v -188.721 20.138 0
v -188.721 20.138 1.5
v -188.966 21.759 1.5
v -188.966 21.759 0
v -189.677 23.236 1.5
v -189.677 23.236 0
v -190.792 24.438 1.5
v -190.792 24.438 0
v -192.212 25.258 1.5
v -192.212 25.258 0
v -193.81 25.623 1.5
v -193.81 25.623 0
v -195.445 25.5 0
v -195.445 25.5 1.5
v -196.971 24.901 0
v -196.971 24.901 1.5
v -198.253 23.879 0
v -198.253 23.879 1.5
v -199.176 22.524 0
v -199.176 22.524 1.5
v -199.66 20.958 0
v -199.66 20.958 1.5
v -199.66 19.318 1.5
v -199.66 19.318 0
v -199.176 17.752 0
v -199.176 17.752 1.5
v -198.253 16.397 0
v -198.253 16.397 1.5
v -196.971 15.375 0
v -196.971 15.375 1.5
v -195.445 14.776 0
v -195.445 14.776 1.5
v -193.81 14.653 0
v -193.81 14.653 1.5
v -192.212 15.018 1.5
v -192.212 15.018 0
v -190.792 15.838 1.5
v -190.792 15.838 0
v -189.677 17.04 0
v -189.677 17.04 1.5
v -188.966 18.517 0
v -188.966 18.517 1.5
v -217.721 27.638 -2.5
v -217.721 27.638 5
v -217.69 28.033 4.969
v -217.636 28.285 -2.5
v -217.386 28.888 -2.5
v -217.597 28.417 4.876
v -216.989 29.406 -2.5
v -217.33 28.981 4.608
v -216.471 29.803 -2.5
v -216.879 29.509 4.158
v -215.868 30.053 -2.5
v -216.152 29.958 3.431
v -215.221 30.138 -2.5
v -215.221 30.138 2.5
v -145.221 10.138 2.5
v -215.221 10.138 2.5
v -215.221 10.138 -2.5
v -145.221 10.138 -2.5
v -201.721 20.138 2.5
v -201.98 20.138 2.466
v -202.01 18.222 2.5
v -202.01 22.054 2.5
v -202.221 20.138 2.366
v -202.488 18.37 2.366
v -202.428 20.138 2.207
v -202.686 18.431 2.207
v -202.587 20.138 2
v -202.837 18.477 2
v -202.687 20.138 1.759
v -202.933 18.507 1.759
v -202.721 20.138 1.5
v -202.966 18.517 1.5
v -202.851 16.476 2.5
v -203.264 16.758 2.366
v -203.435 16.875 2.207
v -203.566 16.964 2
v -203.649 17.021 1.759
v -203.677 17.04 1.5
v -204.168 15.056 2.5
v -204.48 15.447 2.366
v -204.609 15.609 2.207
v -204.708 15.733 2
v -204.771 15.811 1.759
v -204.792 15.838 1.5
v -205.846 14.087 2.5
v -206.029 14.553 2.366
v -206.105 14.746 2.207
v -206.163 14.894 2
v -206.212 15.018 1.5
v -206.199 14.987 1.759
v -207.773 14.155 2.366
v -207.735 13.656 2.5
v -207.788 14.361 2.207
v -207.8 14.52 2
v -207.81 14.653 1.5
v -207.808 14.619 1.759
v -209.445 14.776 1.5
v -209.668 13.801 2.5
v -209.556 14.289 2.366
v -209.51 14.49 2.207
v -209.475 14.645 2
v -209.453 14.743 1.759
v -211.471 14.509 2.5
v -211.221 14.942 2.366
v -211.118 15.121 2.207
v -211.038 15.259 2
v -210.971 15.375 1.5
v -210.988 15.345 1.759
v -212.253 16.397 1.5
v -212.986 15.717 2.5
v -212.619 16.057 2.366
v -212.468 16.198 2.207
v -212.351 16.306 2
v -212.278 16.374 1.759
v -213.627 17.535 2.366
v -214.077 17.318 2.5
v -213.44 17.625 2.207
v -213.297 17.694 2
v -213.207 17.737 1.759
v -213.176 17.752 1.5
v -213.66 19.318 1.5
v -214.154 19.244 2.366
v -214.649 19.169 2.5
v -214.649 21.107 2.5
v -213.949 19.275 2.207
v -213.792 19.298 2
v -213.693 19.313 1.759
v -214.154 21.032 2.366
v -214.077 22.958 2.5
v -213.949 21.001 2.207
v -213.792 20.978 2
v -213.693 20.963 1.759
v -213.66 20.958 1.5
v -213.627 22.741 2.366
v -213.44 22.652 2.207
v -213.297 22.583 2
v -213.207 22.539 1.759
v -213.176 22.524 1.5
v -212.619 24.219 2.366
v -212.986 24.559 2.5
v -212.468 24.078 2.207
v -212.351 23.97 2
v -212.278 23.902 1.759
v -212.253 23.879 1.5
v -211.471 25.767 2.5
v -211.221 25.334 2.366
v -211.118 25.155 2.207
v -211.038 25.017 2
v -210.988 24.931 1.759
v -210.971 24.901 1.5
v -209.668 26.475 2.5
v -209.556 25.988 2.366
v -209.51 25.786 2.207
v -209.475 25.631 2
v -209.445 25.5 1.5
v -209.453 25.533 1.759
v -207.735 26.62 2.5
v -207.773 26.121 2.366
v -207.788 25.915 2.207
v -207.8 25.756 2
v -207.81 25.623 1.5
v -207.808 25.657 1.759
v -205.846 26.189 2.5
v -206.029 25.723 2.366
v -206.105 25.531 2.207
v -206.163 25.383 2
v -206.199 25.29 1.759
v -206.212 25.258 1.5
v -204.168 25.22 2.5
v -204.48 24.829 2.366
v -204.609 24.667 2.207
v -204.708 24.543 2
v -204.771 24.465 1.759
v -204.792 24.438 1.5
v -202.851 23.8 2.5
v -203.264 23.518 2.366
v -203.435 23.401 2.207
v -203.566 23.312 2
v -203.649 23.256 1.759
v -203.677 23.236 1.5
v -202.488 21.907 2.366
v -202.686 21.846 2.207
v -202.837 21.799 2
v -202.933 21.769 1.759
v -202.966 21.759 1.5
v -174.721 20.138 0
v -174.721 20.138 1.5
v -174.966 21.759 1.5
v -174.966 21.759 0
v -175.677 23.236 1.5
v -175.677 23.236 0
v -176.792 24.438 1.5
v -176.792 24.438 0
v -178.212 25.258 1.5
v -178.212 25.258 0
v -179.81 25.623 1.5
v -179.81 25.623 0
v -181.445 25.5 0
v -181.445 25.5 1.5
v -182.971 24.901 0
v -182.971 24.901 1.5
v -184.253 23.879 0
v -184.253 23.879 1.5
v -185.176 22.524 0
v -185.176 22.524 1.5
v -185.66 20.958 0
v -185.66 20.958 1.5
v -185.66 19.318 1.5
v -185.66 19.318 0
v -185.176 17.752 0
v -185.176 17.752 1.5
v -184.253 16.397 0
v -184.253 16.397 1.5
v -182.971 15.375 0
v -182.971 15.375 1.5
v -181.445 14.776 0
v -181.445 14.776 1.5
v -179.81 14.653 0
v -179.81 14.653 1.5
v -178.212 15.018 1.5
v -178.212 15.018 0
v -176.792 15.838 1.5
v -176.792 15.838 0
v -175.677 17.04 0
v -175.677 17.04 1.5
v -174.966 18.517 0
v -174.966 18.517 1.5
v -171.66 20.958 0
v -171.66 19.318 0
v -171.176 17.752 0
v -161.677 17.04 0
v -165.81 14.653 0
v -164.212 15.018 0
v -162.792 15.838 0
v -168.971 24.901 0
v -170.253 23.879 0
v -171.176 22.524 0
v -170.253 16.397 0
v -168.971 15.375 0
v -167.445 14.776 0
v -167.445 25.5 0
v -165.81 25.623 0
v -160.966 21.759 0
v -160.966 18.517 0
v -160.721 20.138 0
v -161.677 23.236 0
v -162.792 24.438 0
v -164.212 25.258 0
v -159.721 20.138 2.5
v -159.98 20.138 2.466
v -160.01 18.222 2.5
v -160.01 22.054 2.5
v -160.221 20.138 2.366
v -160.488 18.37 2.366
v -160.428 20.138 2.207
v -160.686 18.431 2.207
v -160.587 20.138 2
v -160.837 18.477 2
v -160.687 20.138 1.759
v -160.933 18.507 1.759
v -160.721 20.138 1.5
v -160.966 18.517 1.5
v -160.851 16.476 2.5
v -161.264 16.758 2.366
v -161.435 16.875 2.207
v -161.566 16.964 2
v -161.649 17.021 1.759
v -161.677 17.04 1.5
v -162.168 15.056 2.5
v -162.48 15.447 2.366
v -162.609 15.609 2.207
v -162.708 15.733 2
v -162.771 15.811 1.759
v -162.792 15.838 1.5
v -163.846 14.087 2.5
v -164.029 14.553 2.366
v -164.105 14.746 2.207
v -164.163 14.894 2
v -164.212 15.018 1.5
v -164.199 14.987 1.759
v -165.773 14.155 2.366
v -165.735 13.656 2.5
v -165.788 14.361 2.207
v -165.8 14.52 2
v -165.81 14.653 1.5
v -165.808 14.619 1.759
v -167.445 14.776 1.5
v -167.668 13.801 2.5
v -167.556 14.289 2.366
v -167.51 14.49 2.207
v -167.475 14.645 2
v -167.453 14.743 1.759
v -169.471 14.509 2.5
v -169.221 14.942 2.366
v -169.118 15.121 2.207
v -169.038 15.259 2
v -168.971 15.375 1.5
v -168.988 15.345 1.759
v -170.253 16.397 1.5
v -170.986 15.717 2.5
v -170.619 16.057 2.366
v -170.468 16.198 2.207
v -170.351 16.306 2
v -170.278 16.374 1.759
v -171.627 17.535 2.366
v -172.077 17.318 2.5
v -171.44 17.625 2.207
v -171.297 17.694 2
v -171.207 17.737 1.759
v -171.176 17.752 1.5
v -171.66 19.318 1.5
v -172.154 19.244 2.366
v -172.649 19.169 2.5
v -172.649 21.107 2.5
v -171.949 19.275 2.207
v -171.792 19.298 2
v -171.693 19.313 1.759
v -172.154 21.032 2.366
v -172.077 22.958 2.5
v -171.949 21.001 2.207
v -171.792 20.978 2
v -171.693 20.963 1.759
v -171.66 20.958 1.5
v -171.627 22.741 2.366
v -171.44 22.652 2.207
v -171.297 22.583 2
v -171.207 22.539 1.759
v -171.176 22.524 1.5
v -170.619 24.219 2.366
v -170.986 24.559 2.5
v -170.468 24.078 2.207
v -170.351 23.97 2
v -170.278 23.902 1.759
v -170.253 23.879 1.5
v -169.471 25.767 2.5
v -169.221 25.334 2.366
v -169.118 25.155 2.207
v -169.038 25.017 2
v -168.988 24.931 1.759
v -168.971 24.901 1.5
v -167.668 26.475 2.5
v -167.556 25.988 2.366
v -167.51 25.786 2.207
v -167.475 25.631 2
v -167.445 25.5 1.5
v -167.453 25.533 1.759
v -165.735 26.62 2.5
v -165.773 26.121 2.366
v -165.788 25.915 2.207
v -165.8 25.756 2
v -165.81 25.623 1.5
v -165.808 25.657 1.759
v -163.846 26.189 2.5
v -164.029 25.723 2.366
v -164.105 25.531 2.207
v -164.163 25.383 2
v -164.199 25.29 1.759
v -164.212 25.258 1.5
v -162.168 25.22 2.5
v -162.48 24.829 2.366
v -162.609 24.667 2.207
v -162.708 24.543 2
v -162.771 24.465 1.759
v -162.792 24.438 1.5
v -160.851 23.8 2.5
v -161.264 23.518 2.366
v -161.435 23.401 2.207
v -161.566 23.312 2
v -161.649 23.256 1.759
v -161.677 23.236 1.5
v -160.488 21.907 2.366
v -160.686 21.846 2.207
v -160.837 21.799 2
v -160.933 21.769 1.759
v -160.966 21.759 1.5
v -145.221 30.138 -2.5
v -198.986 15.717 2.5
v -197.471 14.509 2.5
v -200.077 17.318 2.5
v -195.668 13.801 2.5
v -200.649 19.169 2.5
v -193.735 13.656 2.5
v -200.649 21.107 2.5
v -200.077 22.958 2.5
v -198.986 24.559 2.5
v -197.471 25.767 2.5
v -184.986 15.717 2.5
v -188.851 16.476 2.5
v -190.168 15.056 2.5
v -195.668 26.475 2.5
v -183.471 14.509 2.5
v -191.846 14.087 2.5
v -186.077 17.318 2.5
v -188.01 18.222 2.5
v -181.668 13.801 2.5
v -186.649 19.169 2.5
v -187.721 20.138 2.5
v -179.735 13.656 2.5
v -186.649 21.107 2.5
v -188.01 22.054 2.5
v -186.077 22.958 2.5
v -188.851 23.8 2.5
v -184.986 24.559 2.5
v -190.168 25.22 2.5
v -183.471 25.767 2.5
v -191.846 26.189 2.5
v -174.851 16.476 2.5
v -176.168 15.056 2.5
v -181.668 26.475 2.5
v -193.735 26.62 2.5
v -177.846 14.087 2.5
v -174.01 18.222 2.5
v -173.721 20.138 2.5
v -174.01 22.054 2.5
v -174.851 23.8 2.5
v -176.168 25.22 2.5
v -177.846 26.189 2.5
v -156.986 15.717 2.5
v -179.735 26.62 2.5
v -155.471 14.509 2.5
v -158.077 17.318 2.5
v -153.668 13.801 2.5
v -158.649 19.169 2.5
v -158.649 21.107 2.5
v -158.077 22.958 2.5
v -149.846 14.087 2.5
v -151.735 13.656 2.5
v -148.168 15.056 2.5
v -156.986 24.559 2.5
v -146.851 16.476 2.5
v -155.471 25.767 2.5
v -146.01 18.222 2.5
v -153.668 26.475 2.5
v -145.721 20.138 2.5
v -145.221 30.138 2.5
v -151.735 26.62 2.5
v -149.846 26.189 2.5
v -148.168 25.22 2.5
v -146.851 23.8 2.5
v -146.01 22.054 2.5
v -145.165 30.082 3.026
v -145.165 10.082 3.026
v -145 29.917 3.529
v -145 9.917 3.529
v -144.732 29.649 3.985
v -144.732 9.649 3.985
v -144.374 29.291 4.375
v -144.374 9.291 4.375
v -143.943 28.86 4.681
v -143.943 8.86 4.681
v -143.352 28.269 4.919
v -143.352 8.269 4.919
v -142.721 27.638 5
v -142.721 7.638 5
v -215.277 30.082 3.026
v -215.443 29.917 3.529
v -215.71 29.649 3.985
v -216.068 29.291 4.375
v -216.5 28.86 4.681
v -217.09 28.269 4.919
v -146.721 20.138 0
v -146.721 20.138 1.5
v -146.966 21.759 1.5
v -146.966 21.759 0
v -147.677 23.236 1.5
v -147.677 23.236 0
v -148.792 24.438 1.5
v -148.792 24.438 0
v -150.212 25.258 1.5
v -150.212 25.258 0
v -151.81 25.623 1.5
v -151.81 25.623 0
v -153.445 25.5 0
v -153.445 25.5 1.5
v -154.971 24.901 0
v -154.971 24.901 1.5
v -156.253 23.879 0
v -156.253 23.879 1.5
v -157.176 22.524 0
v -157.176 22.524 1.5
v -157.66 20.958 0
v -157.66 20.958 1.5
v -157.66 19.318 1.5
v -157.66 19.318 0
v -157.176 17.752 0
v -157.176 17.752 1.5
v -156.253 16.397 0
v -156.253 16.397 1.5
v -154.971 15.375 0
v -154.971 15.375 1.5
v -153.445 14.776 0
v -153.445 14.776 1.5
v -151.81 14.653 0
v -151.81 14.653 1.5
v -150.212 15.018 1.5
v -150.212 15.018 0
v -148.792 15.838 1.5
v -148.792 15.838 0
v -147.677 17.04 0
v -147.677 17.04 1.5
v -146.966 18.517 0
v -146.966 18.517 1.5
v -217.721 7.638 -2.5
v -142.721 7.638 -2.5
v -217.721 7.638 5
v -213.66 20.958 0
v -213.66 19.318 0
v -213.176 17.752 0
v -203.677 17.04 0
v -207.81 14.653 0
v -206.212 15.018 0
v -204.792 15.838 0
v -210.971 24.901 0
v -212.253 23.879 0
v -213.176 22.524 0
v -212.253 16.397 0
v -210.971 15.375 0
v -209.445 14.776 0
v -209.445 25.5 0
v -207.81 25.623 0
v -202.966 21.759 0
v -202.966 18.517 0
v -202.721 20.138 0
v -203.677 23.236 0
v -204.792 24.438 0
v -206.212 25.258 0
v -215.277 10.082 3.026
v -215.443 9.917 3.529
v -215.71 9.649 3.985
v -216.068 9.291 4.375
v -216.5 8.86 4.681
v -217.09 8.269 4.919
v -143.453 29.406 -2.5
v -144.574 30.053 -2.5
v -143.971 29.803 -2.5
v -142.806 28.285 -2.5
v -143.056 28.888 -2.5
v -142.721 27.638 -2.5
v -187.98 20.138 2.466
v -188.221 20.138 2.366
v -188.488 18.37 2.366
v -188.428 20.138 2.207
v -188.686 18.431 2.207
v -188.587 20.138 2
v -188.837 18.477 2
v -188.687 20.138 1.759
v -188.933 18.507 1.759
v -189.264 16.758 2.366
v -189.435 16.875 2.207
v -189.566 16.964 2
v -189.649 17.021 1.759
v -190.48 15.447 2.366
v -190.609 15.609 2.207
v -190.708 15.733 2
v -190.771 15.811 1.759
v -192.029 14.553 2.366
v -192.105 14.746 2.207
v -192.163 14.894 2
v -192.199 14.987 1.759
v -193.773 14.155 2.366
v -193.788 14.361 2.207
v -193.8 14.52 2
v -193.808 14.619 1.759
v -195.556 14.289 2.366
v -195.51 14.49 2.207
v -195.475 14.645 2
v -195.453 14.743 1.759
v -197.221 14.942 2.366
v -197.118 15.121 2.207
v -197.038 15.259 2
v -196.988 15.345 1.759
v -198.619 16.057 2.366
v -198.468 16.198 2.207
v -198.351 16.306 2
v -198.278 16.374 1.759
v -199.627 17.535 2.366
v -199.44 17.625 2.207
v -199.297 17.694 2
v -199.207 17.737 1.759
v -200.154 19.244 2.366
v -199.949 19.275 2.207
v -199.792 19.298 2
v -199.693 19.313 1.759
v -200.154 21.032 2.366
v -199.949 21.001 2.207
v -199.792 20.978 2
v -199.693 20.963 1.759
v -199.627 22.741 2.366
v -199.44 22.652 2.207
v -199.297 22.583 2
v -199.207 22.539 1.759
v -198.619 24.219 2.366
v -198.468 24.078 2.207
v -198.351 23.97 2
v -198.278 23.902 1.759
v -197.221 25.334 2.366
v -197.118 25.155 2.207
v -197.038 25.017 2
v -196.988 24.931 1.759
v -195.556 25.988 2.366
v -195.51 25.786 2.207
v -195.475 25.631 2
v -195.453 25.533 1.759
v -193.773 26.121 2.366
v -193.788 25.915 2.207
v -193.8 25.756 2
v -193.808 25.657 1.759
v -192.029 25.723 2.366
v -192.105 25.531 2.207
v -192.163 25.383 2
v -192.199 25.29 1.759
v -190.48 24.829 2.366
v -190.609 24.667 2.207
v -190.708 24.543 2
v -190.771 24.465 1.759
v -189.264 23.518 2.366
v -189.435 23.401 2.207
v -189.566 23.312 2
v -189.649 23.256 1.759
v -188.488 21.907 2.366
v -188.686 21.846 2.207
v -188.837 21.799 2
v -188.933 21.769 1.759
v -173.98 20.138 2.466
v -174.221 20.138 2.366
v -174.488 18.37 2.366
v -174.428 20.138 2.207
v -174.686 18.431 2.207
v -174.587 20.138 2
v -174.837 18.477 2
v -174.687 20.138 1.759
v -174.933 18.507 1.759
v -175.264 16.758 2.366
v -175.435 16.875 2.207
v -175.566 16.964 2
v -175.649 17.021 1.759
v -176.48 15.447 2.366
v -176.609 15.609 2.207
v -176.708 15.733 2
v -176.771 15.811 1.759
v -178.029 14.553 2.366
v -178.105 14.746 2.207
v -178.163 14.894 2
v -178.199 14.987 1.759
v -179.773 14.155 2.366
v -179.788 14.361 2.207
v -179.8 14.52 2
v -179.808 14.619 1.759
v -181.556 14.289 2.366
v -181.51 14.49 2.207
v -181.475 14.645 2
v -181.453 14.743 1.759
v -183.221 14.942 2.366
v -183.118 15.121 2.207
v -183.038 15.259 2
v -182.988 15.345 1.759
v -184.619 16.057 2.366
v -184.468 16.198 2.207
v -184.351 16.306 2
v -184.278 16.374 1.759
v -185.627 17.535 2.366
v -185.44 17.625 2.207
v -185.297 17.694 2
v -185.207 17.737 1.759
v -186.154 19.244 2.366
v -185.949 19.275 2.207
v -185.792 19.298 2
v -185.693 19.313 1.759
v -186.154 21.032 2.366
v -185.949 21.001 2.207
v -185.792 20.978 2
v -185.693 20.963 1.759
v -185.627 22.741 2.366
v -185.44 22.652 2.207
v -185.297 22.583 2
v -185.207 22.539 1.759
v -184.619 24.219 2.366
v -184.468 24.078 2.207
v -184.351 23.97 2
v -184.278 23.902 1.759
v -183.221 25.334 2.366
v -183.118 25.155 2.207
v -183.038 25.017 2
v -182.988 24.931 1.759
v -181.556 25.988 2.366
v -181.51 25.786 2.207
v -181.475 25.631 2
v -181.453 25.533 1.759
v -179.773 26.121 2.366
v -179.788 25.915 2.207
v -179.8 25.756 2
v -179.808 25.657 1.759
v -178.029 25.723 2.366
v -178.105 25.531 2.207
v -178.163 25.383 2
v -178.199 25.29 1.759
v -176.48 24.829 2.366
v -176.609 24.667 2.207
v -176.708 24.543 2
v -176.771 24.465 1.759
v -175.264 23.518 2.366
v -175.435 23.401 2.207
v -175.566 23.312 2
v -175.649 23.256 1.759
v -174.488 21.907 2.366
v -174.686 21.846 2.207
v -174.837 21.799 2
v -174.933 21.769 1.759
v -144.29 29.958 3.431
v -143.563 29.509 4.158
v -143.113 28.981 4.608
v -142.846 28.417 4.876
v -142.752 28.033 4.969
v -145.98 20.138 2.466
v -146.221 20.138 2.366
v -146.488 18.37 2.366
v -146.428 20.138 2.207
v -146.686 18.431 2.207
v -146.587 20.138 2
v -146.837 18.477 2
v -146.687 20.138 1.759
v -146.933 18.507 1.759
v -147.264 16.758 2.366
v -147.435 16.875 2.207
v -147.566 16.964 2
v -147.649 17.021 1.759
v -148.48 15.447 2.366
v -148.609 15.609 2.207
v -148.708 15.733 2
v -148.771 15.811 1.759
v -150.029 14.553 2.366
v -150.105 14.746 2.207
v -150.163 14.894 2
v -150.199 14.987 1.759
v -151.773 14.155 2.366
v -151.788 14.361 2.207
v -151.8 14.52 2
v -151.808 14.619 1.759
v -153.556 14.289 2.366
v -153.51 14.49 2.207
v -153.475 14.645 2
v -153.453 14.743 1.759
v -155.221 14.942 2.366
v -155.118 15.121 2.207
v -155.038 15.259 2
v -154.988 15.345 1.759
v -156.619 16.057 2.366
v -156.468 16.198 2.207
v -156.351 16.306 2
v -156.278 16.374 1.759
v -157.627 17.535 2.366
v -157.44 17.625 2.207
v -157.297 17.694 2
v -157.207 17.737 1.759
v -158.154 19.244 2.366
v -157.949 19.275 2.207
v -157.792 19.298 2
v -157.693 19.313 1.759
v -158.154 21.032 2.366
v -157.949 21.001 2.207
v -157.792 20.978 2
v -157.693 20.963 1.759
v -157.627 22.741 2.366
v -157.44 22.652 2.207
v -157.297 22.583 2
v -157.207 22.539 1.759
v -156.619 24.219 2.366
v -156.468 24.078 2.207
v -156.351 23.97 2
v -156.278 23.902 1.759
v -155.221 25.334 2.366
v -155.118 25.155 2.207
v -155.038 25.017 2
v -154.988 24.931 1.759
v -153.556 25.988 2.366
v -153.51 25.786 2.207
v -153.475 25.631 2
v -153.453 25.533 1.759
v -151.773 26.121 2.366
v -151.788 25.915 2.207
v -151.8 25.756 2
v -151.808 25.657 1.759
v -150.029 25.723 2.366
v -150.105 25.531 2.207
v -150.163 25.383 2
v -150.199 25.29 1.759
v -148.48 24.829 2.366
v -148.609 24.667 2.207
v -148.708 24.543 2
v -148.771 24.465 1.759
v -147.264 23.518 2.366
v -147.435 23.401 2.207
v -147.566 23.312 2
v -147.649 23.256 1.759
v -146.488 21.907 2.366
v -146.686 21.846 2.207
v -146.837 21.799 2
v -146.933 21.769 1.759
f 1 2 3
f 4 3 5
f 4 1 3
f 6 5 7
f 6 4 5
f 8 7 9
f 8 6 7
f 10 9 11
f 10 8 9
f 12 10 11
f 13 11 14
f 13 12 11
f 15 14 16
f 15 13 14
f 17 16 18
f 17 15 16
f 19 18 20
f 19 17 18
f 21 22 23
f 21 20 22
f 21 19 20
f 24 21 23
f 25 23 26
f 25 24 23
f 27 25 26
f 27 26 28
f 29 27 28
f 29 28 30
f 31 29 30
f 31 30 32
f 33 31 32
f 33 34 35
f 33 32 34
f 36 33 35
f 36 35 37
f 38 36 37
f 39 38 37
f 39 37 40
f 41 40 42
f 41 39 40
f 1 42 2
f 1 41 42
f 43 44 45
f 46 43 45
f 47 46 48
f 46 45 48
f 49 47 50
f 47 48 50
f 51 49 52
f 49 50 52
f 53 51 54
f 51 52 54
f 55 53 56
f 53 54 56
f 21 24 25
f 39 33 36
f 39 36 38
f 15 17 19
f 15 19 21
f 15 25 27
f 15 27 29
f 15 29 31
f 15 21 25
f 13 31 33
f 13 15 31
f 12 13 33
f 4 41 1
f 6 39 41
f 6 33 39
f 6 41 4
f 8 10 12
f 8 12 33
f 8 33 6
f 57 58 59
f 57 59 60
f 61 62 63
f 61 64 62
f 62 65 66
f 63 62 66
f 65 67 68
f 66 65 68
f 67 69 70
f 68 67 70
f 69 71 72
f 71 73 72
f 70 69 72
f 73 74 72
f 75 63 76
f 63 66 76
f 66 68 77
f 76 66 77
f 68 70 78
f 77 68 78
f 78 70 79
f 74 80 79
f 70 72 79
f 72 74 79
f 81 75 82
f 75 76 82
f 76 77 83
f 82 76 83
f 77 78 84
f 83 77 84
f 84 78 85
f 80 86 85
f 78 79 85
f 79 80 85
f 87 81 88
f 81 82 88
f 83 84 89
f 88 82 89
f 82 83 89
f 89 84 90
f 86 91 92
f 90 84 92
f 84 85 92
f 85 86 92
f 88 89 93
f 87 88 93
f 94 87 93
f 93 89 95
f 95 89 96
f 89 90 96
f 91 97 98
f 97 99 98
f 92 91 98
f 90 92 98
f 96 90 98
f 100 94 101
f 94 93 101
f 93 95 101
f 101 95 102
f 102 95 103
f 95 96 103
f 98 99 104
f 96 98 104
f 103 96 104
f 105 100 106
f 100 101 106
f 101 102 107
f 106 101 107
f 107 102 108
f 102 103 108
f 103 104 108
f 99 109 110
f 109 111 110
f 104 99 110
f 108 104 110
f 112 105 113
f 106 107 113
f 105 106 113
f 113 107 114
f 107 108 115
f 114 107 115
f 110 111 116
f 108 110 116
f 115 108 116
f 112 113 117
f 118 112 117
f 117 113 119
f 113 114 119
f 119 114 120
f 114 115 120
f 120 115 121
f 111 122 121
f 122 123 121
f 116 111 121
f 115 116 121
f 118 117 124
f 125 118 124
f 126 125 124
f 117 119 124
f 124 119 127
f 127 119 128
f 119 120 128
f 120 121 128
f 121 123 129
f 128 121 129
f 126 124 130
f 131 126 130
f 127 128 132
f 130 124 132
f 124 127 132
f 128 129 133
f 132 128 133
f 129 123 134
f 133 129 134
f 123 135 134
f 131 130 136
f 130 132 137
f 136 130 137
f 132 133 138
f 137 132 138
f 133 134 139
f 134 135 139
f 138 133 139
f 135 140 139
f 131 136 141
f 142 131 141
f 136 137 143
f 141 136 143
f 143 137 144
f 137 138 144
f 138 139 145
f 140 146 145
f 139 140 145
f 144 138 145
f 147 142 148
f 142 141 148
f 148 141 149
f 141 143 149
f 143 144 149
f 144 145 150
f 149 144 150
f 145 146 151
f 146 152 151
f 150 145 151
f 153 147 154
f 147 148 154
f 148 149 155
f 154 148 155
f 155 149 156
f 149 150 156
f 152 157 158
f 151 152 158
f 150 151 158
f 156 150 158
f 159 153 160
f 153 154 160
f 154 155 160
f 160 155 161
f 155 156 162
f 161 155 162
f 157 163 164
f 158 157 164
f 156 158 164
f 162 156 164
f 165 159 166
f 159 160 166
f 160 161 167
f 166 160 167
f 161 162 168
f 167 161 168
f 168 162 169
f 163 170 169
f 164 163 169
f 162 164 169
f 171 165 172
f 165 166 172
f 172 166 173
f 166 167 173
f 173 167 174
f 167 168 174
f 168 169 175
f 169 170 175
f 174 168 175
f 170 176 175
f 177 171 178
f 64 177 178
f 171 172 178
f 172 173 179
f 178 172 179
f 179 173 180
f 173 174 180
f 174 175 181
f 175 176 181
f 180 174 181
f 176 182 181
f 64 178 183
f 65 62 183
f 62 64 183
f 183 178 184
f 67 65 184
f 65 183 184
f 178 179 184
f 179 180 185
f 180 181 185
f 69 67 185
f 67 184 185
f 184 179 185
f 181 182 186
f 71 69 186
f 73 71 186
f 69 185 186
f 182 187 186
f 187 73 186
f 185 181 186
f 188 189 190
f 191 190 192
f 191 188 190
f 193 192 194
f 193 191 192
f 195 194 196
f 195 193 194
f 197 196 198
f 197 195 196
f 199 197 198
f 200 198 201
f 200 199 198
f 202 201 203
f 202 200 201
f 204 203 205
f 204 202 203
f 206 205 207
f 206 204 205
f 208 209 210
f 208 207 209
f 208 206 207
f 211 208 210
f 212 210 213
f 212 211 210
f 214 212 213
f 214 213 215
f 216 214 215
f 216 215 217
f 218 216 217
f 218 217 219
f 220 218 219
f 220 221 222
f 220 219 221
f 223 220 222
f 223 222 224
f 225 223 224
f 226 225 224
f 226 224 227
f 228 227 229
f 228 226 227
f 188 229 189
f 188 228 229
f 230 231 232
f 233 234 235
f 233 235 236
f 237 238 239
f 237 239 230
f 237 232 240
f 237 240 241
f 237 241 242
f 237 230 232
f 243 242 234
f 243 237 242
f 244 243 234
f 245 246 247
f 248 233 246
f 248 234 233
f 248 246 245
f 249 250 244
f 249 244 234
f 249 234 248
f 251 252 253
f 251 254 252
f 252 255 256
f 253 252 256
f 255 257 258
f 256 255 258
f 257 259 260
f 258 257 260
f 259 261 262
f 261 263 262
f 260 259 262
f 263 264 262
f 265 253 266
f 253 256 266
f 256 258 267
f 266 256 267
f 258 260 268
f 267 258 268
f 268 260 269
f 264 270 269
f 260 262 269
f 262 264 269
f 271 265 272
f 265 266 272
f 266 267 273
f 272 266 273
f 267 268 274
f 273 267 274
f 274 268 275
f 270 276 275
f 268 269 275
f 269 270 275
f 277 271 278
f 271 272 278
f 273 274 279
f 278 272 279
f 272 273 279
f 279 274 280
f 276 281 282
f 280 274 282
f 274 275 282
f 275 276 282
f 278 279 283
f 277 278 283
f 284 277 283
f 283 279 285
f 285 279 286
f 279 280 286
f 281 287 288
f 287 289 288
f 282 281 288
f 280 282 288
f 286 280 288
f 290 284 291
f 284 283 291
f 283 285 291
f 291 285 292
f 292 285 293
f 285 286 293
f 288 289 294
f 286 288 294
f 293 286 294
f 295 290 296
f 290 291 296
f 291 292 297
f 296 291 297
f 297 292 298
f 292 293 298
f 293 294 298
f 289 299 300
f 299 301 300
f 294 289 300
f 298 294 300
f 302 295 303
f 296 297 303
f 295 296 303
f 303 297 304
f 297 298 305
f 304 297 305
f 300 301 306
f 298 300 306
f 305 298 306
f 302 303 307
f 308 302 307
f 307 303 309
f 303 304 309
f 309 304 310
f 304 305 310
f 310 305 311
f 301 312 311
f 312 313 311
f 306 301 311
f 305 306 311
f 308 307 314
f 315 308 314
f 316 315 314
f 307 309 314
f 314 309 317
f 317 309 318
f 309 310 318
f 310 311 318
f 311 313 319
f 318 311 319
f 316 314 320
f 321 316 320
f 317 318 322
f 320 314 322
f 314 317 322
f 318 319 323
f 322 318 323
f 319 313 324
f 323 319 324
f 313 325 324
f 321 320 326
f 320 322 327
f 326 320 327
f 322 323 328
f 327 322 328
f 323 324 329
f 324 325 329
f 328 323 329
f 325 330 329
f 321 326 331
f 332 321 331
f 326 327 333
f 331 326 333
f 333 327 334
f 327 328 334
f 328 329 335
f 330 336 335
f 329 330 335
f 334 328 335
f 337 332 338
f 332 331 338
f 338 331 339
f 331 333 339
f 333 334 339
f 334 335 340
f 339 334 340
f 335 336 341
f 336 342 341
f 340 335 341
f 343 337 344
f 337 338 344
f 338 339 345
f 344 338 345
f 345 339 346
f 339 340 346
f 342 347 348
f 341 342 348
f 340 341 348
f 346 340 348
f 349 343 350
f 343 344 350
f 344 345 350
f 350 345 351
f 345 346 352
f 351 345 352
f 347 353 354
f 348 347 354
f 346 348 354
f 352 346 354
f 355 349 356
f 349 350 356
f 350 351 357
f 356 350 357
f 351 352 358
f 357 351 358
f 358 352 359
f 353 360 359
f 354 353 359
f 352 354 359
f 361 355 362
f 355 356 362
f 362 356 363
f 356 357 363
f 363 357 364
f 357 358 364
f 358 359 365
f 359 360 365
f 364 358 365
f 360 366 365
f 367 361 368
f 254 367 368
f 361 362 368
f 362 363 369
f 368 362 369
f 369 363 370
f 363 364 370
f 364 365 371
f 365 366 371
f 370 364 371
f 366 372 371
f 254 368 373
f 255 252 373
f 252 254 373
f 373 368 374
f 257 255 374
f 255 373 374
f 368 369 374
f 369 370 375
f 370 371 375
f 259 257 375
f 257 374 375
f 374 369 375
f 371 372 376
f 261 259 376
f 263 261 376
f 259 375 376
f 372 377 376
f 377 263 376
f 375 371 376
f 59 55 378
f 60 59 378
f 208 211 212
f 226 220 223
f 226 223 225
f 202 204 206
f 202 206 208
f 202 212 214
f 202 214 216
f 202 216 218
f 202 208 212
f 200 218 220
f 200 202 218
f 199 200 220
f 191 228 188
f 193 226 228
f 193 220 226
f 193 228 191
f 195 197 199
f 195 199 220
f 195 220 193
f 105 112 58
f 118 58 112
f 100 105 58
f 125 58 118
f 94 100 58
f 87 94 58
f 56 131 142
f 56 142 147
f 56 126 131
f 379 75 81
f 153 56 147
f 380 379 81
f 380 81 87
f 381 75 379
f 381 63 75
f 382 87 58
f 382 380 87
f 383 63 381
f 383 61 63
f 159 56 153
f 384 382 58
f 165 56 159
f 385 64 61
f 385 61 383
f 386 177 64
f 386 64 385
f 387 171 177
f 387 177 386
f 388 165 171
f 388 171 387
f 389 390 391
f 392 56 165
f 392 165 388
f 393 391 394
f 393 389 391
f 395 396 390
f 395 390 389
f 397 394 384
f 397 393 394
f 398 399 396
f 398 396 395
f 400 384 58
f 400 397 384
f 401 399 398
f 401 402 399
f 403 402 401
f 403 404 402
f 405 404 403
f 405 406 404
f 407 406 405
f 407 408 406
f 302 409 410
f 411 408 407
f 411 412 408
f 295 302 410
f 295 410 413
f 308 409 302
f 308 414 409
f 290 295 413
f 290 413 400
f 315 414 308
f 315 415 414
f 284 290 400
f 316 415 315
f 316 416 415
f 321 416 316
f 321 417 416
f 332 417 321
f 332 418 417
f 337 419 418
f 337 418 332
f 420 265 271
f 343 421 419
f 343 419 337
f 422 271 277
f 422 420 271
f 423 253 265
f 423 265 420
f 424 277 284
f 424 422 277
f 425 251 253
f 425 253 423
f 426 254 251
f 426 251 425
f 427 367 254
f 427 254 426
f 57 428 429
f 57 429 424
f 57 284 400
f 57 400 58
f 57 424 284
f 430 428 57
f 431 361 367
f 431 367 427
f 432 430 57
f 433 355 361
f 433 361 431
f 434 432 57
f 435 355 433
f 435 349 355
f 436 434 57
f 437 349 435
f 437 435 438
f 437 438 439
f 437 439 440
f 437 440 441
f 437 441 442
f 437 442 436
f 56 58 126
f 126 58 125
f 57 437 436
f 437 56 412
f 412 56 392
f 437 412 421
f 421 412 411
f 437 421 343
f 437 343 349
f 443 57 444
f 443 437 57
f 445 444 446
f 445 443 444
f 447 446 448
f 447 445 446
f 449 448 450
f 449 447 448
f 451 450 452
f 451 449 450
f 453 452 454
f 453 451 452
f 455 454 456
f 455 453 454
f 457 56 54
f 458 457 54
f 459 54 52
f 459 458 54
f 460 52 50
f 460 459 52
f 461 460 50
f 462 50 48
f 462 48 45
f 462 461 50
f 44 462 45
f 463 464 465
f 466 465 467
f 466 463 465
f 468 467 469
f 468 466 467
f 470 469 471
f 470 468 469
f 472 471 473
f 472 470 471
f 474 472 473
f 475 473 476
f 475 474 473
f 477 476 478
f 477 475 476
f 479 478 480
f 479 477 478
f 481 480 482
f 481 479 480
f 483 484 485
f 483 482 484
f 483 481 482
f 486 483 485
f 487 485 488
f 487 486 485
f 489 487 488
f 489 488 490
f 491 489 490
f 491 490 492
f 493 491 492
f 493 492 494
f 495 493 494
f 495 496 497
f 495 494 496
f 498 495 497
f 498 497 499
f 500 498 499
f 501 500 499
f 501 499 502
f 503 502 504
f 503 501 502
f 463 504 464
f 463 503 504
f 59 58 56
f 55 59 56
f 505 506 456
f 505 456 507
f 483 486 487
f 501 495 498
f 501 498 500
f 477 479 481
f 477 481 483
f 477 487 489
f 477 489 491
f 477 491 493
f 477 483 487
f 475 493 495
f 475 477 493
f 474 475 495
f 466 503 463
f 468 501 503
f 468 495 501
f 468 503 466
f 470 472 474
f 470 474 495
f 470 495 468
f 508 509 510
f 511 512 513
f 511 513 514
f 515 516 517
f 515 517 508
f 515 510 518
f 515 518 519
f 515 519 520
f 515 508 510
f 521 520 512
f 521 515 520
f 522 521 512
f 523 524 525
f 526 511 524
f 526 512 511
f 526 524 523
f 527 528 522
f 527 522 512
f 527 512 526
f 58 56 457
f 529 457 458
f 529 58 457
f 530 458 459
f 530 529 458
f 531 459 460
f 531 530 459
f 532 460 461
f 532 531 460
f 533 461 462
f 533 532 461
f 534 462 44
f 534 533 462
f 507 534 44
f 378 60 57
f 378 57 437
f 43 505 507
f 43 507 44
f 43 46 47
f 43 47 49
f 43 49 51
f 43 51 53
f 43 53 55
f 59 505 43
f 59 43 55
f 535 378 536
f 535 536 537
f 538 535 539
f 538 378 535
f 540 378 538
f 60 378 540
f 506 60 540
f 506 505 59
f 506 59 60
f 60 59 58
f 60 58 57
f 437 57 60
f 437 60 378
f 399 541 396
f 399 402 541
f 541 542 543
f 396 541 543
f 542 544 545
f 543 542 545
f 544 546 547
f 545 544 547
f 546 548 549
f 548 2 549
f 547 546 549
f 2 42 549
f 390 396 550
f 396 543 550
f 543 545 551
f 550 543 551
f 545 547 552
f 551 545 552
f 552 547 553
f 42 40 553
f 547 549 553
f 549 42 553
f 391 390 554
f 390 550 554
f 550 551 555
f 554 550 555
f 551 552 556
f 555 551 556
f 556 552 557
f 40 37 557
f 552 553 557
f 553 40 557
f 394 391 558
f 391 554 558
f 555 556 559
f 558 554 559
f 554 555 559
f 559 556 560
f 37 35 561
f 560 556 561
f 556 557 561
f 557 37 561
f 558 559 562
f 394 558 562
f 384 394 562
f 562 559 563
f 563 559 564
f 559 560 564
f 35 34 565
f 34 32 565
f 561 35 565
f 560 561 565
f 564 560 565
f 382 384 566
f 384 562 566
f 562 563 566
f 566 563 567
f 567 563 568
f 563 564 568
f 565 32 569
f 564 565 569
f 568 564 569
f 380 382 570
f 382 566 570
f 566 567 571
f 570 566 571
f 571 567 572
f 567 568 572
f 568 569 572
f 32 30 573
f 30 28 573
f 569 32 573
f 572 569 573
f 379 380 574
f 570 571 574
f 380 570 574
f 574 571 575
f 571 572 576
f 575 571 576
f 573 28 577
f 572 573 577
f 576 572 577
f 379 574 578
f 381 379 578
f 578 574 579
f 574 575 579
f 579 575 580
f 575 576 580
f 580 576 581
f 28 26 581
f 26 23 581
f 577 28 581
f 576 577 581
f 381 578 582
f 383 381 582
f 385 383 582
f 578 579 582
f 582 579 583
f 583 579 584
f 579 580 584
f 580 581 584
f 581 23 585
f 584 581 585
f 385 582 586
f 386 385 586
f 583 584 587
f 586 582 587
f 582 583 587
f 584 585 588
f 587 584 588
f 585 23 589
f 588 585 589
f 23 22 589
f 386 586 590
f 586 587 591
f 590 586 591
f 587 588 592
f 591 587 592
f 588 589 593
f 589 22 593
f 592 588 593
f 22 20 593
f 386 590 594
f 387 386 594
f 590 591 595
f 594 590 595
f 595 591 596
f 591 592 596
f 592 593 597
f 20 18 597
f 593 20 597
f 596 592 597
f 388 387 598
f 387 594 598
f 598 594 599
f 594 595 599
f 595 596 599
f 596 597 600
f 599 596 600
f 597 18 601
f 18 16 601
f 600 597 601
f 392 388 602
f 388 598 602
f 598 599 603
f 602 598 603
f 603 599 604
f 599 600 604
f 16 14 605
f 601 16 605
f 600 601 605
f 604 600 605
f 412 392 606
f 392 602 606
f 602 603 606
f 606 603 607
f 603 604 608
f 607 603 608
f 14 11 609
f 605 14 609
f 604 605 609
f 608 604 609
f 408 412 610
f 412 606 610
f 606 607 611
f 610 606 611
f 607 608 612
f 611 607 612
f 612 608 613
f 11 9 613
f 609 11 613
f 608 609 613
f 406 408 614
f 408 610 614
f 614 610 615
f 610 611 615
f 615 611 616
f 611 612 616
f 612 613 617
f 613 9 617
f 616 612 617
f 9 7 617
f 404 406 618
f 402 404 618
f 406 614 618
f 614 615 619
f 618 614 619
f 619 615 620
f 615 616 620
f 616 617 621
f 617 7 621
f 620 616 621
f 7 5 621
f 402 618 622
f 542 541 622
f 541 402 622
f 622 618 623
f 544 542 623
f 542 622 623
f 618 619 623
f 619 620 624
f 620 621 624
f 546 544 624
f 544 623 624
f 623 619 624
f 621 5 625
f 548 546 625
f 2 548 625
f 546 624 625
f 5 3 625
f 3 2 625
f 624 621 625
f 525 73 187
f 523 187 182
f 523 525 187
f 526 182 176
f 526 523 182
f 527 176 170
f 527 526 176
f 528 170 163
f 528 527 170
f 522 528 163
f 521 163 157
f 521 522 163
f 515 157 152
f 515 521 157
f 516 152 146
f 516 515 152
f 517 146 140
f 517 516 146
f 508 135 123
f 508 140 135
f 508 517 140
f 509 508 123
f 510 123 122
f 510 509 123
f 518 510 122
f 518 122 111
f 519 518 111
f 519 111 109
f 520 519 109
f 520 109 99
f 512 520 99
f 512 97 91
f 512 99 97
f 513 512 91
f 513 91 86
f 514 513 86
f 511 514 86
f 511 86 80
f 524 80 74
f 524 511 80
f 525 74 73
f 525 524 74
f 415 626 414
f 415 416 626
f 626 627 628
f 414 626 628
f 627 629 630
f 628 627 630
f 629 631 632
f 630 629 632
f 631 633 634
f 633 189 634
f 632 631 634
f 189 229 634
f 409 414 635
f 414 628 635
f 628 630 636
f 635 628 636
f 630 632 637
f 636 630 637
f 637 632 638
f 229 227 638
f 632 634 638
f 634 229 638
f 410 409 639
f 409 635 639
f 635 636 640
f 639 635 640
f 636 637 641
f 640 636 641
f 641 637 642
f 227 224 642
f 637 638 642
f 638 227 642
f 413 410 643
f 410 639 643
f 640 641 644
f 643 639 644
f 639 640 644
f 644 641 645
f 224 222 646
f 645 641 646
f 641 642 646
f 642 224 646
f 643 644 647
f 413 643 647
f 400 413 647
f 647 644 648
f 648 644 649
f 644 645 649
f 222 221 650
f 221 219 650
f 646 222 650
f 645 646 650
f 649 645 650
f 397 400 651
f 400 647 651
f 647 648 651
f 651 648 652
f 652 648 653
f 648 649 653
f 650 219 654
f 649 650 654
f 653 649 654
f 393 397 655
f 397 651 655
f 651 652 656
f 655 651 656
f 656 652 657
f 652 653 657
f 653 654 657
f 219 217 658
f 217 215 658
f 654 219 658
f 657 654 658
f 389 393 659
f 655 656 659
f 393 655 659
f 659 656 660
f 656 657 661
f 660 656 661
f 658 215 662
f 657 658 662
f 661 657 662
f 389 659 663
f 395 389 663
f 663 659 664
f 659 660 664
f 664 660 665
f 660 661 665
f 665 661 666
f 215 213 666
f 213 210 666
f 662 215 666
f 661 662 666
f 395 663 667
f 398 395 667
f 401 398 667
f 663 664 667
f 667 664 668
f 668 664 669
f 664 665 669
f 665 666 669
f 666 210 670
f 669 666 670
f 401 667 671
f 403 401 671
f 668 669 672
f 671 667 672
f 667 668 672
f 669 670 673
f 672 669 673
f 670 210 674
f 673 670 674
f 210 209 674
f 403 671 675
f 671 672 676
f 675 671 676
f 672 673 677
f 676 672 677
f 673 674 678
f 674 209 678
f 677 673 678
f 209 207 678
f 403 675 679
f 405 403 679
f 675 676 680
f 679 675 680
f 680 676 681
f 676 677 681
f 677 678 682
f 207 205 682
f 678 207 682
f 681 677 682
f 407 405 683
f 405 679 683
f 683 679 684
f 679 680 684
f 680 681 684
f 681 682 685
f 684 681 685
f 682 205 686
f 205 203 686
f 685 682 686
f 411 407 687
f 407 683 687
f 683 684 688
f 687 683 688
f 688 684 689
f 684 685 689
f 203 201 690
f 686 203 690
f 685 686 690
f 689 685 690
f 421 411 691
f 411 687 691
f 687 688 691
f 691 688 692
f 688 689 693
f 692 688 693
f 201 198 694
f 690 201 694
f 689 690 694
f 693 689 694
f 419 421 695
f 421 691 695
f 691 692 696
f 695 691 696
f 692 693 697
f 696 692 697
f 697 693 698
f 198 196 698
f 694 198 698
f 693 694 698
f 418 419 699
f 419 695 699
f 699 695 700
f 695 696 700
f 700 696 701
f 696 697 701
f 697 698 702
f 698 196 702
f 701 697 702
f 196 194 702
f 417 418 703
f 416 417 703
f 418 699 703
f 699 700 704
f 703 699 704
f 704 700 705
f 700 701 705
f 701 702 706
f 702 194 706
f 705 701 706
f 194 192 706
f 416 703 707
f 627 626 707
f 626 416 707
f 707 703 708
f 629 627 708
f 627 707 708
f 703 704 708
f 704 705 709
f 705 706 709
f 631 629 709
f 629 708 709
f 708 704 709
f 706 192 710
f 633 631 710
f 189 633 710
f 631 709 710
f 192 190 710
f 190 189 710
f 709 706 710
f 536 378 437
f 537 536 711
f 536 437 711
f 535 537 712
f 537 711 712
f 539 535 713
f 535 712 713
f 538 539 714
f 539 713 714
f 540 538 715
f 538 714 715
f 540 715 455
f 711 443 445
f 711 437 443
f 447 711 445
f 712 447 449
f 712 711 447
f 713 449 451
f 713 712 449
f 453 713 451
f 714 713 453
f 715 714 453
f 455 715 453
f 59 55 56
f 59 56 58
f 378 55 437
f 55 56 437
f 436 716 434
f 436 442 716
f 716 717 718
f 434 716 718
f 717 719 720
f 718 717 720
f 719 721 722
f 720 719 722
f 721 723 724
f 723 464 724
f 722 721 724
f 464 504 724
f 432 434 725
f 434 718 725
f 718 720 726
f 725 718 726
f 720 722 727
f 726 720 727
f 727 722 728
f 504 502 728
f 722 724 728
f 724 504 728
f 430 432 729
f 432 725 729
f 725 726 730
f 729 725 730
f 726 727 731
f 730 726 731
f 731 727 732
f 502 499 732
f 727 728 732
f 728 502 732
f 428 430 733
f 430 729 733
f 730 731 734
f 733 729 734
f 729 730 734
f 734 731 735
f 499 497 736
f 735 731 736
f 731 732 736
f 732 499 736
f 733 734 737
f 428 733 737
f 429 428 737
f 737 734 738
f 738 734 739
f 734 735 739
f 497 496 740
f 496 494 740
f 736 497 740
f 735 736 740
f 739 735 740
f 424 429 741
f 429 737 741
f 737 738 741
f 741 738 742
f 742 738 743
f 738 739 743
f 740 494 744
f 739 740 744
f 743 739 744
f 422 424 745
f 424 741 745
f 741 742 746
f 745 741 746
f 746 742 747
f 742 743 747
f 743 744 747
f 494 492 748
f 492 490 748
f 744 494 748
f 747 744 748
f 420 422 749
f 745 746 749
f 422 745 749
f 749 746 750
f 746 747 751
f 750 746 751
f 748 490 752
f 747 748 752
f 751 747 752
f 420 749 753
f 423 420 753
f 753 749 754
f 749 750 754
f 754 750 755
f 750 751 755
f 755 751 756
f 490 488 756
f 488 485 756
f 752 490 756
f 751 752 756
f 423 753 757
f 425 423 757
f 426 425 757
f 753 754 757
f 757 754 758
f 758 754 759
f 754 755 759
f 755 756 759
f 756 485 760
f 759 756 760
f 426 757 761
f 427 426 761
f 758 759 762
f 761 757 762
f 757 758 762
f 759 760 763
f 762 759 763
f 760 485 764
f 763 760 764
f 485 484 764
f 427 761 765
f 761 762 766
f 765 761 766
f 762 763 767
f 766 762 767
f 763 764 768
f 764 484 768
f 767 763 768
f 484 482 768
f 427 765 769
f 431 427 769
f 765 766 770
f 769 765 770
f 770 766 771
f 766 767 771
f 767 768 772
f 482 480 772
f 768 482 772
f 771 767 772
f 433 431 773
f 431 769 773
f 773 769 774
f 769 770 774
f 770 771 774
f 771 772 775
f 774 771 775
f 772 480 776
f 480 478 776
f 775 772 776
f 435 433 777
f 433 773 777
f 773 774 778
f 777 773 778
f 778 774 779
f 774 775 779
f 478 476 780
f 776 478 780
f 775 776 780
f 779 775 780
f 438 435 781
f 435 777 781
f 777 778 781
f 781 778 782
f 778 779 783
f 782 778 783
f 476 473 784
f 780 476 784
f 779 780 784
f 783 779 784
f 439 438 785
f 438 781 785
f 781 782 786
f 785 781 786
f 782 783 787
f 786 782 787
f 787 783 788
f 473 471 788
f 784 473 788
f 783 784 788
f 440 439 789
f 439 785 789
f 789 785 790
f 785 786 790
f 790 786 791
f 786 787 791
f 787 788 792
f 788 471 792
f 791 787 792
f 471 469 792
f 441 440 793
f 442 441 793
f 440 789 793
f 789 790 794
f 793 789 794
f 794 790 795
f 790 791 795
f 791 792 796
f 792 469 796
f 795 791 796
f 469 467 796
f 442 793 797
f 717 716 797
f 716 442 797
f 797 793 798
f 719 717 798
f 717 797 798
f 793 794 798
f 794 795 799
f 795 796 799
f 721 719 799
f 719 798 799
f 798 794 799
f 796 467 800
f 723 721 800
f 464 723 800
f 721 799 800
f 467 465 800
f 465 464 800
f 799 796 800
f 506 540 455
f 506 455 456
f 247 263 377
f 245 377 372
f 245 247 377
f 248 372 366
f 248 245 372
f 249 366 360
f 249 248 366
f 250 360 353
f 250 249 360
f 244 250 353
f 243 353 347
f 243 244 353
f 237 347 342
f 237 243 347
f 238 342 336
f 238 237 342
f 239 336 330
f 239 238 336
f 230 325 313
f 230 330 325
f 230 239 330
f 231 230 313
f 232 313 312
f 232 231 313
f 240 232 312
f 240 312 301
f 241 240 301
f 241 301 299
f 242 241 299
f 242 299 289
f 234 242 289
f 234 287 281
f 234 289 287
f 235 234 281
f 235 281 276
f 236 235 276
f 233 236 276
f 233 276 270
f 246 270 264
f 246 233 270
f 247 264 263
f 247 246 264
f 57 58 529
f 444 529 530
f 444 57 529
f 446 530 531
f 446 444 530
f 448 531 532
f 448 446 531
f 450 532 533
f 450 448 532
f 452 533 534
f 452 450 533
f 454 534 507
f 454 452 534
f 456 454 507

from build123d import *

# Parameters (mm, degrees)
F1_W          = 70
F1_H          = 20
F2_DEPTH      = 2.5
F2_DEPTH_BACK = 2.5
F0_R          = 5.5
F3_DEPTH      = 25.4
F5_DEPTH      = 7.5
F6_R          = 2.49999
F7_R          = 1


# Not quite as in the source:
# - a fillet or chamfer is up to 0.001 mm smaller than in the source, because OpenCascade refuses the exact size


with BuildPart() as f2:
    # F1 (on face) → F2 (new body, two sides)
    with BuildSketch(Plane.XY) as f2_sk:
        with Locations((-180.2211654186, 20.1380707997)):
            Rectangle(F1_W, F1_H)
    extrude(amount=F2_DEPTH)
    extrude(f2_sk.sketch, amount=-F2_DEPTH_BACK)

    # F0 (on Top) → F3 (cut)
    with BuildSketch(Plane.XY):
        with Locations((-152.2211654186, 20.1380707997)):
            Circle(F0_R)
        with Locations((-166.2211654186, 20.1380707997)):
            Circle(F0_R)
        with Locations((-180.2211654186, 20.1380707997)):
            Circle(F0_R)
        with Locations((-194.2211654186, 20.1380707997)):
            Circle(F0_R)
        with Locations((-208.2211654186, 20.1380707997)):
            Circle(F0_R)
    extrude(amount=F3_DEPTH, mode=Mode.SUBTRACT)

    # F7
    f7_edges = [f2.edges().sort_by_distance(p)[0] for p in [
        (-157.721165, 20.138071, 2.5),
        (-171.721165, 20.138071, 2.5),
        (-185.721165, 20.138071, 2.5),
        (-199.721165, 20.138071, 2.5),
        (-213.721165, 20.138071, 2.5),
    ]]
    fillet(f7_edges, radius=F7_R)


with BuildPart() as f5:
    # F4 (on face) → F5 (new body)
    with BuildSketch(Plane(origin=(0, 0, -2.5), x_dir=(1, 0, 0), z_dir=(0, 0, -1))):
        Polygon((-145.2211654186, -30.1380707997), (-142.7211654186, -30.1380707997), (-142.7211654186, -7.6380707997), (-217.7211654186, -7.6380707997), (-217.7211654186, -30.1380707997), (-215.2211654186, -30.1380707997), (-215.2211654186, -10.1380707997), (-145.2211654186, -10.1380707997), align=None)
    extrude(amount=-F5_DEPTH)

    # F6 (radius 2.5 in the source; OpenCascade refuses exactly that, so slightly less here)
    f6_edges = [f5.edges().sort_by_distance(p)[0] for p in [
        (-180.221165, 10.138071, 5),
        (-145.221165, 20.138071, 5),
        (-215.221165, 20.138071, 5),
        (-216.471165, 30.138071, 5),
        (-143.971165, 30.138071, 5),
        (-142.721165, 30.138071, 1.25),
        (-217.721165, 30.138071, 1.25),
    ]]
    fillet(f6_edges, radius=F6_R)


solid = Compound([f2.part, f5.part])
